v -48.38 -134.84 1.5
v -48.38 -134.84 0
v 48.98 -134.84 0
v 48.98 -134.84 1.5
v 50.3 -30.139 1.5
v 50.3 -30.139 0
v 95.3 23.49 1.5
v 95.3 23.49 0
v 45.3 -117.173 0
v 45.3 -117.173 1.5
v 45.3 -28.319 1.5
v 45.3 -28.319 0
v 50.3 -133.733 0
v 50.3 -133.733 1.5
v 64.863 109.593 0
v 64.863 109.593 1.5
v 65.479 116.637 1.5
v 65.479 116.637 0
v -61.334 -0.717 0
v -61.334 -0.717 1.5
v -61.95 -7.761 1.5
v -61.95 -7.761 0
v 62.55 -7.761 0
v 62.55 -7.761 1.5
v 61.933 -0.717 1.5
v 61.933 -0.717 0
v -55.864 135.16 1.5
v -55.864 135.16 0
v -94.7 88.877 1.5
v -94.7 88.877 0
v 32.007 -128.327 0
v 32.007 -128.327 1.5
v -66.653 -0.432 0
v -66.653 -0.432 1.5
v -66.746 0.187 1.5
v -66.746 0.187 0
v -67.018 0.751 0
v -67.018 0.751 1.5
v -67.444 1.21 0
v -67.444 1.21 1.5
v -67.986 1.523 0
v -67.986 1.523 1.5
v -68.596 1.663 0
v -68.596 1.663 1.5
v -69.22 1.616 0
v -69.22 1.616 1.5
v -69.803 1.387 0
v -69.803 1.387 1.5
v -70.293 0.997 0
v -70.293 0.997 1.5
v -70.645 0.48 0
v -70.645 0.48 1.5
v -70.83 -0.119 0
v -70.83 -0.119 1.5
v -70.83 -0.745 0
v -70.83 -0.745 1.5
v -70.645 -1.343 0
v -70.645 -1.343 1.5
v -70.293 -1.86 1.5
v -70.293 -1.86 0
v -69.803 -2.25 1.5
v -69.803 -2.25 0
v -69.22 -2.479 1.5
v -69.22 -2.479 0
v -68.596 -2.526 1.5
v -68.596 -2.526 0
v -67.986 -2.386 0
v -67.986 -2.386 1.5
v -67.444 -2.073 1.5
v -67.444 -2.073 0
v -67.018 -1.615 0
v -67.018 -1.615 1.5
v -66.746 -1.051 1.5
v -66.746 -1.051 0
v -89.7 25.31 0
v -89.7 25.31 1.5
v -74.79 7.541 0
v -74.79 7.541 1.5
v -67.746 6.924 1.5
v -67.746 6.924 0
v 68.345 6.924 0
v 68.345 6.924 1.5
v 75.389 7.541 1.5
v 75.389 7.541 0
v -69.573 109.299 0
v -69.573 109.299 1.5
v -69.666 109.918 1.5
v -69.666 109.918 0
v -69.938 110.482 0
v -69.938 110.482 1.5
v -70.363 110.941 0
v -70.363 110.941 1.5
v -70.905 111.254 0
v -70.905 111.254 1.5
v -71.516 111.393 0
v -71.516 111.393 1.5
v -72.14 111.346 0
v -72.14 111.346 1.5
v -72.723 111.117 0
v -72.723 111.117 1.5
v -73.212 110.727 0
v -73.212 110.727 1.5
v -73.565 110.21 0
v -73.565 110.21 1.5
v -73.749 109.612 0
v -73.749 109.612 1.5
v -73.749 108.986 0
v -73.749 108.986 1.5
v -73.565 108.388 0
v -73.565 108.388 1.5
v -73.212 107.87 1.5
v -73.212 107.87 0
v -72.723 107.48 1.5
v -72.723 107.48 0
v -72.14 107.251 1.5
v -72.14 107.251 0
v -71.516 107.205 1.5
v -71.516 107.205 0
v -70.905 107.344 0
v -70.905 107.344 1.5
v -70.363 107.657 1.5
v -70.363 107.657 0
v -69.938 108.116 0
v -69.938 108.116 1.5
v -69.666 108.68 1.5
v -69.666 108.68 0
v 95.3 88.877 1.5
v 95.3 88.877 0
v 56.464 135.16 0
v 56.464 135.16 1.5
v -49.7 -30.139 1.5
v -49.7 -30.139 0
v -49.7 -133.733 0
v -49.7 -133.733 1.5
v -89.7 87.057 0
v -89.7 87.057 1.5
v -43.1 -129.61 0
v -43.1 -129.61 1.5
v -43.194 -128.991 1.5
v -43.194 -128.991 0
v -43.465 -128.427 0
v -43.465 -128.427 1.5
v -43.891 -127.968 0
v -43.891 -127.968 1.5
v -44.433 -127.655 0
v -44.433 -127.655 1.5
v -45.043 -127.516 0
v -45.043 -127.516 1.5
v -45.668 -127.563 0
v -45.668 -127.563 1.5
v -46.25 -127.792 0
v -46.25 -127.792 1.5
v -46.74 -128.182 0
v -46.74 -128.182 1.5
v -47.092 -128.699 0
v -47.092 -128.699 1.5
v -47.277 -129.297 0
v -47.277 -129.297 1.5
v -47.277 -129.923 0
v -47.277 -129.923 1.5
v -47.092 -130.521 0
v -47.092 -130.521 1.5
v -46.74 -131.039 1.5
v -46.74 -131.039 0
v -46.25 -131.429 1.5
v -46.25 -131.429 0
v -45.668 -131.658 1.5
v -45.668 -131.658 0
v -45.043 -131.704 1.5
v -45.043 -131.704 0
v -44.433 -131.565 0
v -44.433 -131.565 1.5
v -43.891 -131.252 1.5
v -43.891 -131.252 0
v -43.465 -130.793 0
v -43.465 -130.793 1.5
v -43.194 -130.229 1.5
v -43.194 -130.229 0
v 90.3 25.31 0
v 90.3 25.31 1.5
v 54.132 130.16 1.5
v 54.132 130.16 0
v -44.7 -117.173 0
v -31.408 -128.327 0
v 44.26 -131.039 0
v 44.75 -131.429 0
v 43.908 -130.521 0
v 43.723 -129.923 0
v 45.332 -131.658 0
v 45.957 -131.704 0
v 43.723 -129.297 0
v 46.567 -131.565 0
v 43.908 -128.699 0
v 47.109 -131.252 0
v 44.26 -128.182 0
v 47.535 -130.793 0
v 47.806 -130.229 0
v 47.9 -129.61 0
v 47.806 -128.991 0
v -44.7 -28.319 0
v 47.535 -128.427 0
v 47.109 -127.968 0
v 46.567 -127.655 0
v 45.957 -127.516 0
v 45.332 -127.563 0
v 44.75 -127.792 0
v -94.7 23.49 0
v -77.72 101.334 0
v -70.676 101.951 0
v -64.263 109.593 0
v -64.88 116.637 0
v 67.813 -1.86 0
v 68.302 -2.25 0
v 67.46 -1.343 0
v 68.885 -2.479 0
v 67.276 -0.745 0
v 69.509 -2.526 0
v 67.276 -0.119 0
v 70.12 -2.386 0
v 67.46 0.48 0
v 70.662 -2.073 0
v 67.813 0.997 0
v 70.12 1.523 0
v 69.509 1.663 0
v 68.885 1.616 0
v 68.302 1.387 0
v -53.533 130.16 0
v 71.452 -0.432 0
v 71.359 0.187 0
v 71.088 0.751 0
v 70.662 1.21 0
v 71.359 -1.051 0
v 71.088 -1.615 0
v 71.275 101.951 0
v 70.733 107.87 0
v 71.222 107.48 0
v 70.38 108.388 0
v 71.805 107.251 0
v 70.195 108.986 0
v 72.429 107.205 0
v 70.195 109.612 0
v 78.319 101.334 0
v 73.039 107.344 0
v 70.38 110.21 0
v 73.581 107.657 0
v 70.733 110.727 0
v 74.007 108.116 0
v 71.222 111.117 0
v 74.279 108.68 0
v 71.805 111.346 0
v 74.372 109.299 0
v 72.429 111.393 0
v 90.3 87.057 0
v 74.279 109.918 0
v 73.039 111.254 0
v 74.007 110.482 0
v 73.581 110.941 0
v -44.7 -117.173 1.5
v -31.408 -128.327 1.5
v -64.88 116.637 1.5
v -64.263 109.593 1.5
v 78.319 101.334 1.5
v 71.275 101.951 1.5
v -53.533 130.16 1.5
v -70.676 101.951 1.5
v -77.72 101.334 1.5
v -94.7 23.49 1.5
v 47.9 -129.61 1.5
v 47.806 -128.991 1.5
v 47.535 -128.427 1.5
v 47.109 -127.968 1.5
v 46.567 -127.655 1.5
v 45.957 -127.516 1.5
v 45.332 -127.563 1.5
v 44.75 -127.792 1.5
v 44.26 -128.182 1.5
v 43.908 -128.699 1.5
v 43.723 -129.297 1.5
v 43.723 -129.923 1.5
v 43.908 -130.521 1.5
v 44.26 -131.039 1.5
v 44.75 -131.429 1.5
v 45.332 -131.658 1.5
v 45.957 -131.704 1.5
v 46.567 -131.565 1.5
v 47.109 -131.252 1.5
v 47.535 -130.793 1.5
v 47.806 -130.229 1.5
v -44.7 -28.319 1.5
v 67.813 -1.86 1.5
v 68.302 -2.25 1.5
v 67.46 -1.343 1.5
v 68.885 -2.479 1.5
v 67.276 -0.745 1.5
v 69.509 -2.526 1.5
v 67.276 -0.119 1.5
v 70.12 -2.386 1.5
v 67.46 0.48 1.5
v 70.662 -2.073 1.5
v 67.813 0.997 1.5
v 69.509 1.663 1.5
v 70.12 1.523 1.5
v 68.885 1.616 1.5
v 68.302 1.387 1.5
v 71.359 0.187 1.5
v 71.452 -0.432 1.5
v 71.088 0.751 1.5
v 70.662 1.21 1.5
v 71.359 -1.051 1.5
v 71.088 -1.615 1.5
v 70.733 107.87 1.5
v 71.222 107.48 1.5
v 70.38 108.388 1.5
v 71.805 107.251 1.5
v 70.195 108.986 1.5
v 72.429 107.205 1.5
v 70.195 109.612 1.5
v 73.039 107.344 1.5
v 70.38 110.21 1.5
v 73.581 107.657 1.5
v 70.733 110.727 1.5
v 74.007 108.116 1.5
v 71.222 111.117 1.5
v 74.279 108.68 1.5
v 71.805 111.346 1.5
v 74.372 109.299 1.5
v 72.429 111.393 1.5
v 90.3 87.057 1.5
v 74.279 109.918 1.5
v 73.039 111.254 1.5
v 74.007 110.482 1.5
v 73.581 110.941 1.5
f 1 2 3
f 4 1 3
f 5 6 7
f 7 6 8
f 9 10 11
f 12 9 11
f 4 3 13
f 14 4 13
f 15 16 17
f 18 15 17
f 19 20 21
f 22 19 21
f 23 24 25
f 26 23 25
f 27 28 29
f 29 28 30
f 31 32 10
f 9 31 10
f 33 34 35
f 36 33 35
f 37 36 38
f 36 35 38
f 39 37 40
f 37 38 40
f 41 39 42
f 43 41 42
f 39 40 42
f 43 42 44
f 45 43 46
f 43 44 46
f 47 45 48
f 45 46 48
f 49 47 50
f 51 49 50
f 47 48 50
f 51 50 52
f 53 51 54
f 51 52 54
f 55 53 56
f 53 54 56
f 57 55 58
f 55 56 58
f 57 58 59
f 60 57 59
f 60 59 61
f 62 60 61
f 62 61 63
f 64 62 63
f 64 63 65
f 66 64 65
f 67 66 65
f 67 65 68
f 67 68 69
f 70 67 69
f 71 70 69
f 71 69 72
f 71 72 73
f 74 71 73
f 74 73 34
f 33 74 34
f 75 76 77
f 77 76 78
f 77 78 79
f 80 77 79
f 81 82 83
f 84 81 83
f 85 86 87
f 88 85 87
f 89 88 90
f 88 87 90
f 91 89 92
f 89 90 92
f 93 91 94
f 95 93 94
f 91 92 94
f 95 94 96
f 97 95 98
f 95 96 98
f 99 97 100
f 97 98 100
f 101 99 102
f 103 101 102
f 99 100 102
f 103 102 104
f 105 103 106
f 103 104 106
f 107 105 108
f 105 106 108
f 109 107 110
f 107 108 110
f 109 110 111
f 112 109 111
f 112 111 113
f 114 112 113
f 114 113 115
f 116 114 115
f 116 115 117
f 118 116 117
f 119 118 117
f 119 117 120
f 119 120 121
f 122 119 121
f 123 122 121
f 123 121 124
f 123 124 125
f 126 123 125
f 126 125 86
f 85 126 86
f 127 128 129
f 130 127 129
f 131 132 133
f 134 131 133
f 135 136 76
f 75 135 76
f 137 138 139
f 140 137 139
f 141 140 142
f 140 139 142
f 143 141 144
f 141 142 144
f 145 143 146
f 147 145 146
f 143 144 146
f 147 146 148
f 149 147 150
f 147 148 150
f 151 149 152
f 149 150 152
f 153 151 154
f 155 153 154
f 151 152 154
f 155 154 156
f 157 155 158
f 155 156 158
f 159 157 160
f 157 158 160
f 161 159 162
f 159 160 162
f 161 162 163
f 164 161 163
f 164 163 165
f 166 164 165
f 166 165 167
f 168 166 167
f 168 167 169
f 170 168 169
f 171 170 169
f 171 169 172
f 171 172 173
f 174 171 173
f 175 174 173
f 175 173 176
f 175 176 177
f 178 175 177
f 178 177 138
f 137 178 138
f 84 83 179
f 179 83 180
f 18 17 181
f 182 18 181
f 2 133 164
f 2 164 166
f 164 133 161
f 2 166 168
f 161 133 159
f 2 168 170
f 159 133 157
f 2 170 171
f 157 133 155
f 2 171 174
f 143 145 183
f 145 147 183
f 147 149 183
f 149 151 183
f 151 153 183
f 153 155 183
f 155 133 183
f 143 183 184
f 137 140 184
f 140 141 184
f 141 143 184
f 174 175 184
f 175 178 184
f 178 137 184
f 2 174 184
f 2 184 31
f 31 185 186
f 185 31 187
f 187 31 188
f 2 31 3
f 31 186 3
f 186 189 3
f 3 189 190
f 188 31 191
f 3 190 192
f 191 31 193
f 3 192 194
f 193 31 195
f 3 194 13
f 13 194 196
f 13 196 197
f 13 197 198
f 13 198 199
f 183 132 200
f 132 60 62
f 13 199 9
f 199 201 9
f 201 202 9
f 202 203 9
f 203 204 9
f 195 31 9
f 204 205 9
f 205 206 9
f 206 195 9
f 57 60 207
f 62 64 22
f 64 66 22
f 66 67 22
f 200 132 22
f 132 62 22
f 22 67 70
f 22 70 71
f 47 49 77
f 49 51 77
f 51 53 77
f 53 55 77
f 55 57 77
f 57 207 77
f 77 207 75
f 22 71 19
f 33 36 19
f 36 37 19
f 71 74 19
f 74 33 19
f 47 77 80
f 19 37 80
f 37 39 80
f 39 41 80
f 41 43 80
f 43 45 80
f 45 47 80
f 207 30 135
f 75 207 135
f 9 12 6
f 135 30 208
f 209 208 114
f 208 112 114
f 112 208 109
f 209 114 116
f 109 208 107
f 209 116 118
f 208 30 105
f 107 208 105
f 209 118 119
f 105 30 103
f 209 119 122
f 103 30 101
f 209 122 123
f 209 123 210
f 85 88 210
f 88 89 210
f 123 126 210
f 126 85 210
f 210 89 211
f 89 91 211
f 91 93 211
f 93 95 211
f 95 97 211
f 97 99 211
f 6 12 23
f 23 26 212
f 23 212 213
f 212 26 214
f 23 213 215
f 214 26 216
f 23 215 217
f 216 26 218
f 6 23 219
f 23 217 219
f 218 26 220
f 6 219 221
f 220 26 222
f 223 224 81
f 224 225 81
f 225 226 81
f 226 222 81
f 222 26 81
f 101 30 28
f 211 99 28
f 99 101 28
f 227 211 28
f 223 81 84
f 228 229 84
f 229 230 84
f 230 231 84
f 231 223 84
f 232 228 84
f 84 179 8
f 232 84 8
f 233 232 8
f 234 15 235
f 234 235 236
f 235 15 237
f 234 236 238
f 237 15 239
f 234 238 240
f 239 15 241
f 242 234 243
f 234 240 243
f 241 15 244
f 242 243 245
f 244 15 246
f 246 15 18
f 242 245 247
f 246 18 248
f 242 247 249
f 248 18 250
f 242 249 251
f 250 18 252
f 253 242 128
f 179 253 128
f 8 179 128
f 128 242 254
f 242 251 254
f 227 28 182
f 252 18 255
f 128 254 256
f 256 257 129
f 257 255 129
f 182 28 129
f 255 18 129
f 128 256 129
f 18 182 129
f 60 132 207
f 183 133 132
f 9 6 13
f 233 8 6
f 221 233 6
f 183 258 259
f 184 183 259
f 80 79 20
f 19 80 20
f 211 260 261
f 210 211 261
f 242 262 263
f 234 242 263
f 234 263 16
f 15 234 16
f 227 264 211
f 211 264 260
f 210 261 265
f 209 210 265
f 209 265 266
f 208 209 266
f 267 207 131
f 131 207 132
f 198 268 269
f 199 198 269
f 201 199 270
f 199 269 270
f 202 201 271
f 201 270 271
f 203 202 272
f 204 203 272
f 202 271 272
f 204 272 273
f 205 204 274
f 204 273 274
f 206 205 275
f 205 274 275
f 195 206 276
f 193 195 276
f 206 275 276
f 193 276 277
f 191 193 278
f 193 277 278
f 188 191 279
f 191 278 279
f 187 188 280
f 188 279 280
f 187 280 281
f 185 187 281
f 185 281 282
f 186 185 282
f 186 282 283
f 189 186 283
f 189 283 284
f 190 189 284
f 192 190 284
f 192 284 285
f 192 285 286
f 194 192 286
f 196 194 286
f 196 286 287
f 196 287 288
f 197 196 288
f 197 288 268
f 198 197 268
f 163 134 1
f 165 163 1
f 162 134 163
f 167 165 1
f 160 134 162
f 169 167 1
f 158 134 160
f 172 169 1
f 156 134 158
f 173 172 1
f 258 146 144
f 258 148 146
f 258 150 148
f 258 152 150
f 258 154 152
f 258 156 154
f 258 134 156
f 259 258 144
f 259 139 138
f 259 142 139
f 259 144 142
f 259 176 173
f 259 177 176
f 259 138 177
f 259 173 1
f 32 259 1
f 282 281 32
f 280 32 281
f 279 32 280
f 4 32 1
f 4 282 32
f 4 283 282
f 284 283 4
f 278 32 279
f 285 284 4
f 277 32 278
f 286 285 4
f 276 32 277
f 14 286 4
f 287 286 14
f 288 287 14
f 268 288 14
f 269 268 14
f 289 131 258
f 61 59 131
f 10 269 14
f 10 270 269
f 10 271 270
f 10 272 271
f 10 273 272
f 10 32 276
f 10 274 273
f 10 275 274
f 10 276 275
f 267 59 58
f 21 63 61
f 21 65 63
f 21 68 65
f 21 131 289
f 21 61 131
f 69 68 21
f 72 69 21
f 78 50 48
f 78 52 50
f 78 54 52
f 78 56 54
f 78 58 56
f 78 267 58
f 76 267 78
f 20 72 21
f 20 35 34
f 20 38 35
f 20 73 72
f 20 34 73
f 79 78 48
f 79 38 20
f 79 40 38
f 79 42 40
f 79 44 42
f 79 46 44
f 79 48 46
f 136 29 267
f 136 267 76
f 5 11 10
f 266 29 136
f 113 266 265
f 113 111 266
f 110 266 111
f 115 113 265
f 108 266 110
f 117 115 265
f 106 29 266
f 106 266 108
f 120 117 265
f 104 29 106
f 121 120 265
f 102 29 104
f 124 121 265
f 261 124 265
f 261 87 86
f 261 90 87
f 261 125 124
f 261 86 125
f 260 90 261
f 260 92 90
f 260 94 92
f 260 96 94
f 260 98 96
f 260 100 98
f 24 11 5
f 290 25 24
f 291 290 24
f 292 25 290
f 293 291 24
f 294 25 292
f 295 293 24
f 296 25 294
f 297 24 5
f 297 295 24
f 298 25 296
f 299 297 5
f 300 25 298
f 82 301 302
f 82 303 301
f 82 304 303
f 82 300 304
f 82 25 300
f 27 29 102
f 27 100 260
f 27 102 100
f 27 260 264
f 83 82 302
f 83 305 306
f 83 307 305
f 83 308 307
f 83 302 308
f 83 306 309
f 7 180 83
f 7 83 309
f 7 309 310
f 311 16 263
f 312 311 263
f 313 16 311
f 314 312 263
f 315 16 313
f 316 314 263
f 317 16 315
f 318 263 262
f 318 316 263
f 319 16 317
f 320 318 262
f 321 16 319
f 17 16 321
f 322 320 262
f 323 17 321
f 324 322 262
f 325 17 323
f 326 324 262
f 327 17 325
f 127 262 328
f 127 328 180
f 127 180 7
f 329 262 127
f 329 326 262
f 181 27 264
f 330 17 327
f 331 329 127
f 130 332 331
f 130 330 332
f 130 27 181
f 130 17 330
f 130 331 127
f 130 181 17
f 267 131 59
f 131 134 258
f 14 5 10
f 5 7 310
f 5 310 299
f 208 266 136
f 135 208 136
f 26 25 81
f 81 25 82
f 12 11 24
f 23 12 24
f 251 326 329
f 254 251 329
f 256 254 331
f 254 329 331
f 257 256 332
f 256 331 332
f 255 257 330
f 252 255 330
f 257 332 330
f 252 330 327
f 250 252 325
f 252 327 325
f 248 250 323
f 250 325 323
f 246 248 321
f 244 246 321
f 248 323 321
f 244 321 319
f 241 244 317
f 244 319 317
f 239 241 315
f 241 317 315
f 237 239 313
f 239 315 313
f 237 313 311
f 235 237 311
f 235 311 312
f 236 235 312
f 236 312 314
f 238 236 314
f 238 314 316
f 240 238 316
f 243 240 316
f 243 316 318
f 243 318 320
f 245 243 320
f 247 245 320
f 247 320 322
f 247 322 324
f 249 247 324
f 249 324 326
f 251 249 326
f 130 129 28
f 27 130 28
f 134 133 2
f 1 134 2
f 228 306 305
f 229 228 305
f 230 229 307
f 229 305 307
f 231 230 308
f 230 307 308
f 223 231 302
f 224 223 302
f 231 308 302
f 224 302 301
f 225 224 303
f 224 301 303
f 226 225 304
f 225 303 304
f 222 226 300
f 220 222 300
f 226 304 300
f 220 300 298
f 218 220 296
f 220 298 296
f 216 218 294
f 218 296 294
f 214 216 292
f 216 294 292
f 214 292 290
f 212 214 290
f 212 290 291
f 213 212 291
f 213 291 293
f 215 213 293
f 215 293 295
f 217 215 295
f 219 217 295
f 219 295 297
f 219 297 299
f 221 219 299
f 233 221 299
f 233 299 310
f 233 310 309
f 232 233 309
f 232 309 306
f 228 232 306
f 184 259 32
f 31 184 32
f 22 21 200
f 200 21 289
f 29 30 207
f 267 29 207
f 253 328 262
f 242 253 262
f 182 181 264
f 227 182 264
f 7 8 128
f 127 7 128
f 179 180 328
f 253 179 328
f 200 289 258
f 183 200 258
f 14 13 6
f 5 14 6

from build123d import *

# Parameters (mm, degrees)
RESSALTO_EXTRUS_O1_DEPTH = 1.5
CORTE_EXTRUS_O1_REACH    = 3.5
ESBO_O2_R                = 2.1
CORTE_EXTRUS_O2_DEPTH    = 10


with BuildPart() as part:
    # Esboço1 → Ressalto-extrusão1 (new body)
    with BuildSketch(Plane.XY):
        Polygon((56.463679973, 135.159747673), (-55.864365487, 135.159747673), (-94.700342757, 88.87683224), (-94.700342757, 23.490318666), (-49.700342757, -30.138593001), (-49.700342757, -133.732537696), (-48.380219867, -134.840252327), (48.979534352, -134.840252327), (50.299657243, -133.732537696), (50.299657243, -30.138593001), (95.299657243, 23.490318666), (95.299657243, 88.87683224), align=None)
    extrude(amount=RESSALTO_EXTRUS_O1_DEPTH)

    # Esboço2 → Corte-extrusão1 (cut, up to next)
    with BuildSketch(Plane.XY.offset(1.5), mode=Mode.PRIVATE) as corte_extrus_o1_sk1:
        with Locations((-71.672714117, 109.298736063)):
            Circle(ESBO_O2_R)
    corte_extrus_o1_tool1 = extrude(corte_extrus_o1_sk1.sketch, amount=-CORTE_EXTRUS_O1_REACH, mode=Mode.PRIVATE) & part.part
    add(corte_extrus_o1_tool1.solids().sort_by_distance((-71.672714, 109.298736, 1.5))[0], mode=Mode.SUBTRACT)
    # Esboço2 → Corte-extrusão1 (cut, up to next)
    with BuildSketch(Plane.XY.offset(1.5), mode=Mode.PRIVATE) as corte_extrus_o1_sk2:
        with Locations((-45.200342757, -129.610252327)):
            Circle(ESBO_O2_R)
    corte_extrus_o1_tool2 = extrude(corte_extrus_o1_sk2.sketch, amount=-CORTE_EXTRUS_O1_REACH, mode=Mode.PRIVATE) & part.part
    add(corte_extrus_o1_tool2.solids().sort_by_distance((-45.200343, -129.610252, 1.5))[0], mode=Mode.SUBTRACT)
    # Esboço2 → Corte-extrusão1 (cut, up to next)
    with BuildSketch(Plane.XY.offset(1.5), mode=Mode.PRIVATE) as corte_extrus_o1_sk3:
        with Locations((45.799657243, -129.610252327)):
            Circle(ESBO_O2_R)
    corte_extrus_o1_tool3 = extrude(corte_extrus_o1_sk3.sketch, amount=-CORTE_EXTRUS_O1_REACH, mode=Mode.PRIVATE) & part.part
    add(corte_extrus_o1_tool3.solids().sort_by_distance((45.799657, -129.610252, 1.5))[0], mode=Mode.SUBTRACT)
    # Esboço2 → Corte-extrusão1 (cut, up to next)
    with BuildSketch(Plane.XY.offset(1.5), mode=Mode.PRIVATE) as corte_extrus_o1_sk4:
        with Locations((72.272028603, 109.298736063)):
            Circle(ESBO_O2_R)
    corte_extrus_o1_tool4 = extrude(corte_extrus_o1_sk4.sketch, amount=-CORTE_EXTRUS_O1_REACH, mode=Mode.PRIVATE) & part.part
    add(corte_extrus_o1_tool4.solids().sort_by_distance((72.272029, 109.298736, 1.5))[0], mode=Mode.SUBTRACT)
    # Esboço2 → Corte-extrusão1 (cut, up to next)
    with BuildSketch(Plane.XY.offset(1.5), mode=Mode.PRIVATE) as corte_extrus_o1_sk5:
        with Locations((-68.753142763, -0.431592924)):
            Circle(ESBO_O2_R)
    corte_extrus_o1_tool5 = extrude(corte_extrus_o1_sk5.sketch, amount=-CORTE_EXTRUS_O1_REACH, mode=Mode.PRIVATE) & part.part
    add(corte_extrus_o1_tool5.solids().sort_by_distance((-68.753143, -0.431593, 1.5))[0], mode=Mode.SUBTRACT)
    # Esboço2 → Corte-extrusão1 (cut, up to next)
    with BuildSketch(Plane.XY.offset(1.5), mode=Mode.PRIVATE) as corte_extrus_o1_sk6:
        with Locations((69.352457249, -0.431592924)):
            Circle(ESBO_O2_R)
    corte_extrus_o1_tool6 = extrude(corte_extrus_o1_sk6.sketch, amount=-CORTE_EXTRUS_O1_REACH, mode=Mode.PRIVATE) & part.part
    add(corte_extrus_o1_tool6.solids().sort_by_distance((69.352457, -0.431593, 1.5))[0], mode=Mode.SUBTRACT)

    # Esboço3 → Corte-extrusão2 (cut)
    with BuildSketch(Plane.XY.offset(1.5)):
        Polygon((-53.532827197, 130.159747673), (-64.879577854, 116.637216813), (-64.263293687, 109.593056549), (-70.675930858, 101.950773162), (-77.720091122, 101.334488995), (-89.700342757, 87.056981069), (-89.700342757, 25.310169837), (-74.789956765, 7.540663764), (-67.745796501, 6.924379597), (-61.334000151, -0.716901738), (-61.950284318, -7.761062002), (-44.700342757, -28.318741829), (-44.700342757, -117.173246706), (-31.407709232, -128.327090595), (32.007023717, -128.327090595), (45.299657243, -117.173246706), (45.299657243, -28.318741829), (62.549598803, -7.761062002), (61.933314636, -0.716901738), (68.345110987, 6.924379597), (75.389271251, 7.540663764), (90.299657243, 25.310169837), (90.299657243, 87.056981069), (78.319405608, 101.334488995), (71.275245343, 101.950773162), (64.862608173, 109.593056549), (65.47889234, 116.637216813), (54.132141682, 130.159747673), align=None)
    extrude(amount=-CORTE_EXTRUS_O2_DEPTH, mode=Mode.SUBTRACT)


solid = part.part
